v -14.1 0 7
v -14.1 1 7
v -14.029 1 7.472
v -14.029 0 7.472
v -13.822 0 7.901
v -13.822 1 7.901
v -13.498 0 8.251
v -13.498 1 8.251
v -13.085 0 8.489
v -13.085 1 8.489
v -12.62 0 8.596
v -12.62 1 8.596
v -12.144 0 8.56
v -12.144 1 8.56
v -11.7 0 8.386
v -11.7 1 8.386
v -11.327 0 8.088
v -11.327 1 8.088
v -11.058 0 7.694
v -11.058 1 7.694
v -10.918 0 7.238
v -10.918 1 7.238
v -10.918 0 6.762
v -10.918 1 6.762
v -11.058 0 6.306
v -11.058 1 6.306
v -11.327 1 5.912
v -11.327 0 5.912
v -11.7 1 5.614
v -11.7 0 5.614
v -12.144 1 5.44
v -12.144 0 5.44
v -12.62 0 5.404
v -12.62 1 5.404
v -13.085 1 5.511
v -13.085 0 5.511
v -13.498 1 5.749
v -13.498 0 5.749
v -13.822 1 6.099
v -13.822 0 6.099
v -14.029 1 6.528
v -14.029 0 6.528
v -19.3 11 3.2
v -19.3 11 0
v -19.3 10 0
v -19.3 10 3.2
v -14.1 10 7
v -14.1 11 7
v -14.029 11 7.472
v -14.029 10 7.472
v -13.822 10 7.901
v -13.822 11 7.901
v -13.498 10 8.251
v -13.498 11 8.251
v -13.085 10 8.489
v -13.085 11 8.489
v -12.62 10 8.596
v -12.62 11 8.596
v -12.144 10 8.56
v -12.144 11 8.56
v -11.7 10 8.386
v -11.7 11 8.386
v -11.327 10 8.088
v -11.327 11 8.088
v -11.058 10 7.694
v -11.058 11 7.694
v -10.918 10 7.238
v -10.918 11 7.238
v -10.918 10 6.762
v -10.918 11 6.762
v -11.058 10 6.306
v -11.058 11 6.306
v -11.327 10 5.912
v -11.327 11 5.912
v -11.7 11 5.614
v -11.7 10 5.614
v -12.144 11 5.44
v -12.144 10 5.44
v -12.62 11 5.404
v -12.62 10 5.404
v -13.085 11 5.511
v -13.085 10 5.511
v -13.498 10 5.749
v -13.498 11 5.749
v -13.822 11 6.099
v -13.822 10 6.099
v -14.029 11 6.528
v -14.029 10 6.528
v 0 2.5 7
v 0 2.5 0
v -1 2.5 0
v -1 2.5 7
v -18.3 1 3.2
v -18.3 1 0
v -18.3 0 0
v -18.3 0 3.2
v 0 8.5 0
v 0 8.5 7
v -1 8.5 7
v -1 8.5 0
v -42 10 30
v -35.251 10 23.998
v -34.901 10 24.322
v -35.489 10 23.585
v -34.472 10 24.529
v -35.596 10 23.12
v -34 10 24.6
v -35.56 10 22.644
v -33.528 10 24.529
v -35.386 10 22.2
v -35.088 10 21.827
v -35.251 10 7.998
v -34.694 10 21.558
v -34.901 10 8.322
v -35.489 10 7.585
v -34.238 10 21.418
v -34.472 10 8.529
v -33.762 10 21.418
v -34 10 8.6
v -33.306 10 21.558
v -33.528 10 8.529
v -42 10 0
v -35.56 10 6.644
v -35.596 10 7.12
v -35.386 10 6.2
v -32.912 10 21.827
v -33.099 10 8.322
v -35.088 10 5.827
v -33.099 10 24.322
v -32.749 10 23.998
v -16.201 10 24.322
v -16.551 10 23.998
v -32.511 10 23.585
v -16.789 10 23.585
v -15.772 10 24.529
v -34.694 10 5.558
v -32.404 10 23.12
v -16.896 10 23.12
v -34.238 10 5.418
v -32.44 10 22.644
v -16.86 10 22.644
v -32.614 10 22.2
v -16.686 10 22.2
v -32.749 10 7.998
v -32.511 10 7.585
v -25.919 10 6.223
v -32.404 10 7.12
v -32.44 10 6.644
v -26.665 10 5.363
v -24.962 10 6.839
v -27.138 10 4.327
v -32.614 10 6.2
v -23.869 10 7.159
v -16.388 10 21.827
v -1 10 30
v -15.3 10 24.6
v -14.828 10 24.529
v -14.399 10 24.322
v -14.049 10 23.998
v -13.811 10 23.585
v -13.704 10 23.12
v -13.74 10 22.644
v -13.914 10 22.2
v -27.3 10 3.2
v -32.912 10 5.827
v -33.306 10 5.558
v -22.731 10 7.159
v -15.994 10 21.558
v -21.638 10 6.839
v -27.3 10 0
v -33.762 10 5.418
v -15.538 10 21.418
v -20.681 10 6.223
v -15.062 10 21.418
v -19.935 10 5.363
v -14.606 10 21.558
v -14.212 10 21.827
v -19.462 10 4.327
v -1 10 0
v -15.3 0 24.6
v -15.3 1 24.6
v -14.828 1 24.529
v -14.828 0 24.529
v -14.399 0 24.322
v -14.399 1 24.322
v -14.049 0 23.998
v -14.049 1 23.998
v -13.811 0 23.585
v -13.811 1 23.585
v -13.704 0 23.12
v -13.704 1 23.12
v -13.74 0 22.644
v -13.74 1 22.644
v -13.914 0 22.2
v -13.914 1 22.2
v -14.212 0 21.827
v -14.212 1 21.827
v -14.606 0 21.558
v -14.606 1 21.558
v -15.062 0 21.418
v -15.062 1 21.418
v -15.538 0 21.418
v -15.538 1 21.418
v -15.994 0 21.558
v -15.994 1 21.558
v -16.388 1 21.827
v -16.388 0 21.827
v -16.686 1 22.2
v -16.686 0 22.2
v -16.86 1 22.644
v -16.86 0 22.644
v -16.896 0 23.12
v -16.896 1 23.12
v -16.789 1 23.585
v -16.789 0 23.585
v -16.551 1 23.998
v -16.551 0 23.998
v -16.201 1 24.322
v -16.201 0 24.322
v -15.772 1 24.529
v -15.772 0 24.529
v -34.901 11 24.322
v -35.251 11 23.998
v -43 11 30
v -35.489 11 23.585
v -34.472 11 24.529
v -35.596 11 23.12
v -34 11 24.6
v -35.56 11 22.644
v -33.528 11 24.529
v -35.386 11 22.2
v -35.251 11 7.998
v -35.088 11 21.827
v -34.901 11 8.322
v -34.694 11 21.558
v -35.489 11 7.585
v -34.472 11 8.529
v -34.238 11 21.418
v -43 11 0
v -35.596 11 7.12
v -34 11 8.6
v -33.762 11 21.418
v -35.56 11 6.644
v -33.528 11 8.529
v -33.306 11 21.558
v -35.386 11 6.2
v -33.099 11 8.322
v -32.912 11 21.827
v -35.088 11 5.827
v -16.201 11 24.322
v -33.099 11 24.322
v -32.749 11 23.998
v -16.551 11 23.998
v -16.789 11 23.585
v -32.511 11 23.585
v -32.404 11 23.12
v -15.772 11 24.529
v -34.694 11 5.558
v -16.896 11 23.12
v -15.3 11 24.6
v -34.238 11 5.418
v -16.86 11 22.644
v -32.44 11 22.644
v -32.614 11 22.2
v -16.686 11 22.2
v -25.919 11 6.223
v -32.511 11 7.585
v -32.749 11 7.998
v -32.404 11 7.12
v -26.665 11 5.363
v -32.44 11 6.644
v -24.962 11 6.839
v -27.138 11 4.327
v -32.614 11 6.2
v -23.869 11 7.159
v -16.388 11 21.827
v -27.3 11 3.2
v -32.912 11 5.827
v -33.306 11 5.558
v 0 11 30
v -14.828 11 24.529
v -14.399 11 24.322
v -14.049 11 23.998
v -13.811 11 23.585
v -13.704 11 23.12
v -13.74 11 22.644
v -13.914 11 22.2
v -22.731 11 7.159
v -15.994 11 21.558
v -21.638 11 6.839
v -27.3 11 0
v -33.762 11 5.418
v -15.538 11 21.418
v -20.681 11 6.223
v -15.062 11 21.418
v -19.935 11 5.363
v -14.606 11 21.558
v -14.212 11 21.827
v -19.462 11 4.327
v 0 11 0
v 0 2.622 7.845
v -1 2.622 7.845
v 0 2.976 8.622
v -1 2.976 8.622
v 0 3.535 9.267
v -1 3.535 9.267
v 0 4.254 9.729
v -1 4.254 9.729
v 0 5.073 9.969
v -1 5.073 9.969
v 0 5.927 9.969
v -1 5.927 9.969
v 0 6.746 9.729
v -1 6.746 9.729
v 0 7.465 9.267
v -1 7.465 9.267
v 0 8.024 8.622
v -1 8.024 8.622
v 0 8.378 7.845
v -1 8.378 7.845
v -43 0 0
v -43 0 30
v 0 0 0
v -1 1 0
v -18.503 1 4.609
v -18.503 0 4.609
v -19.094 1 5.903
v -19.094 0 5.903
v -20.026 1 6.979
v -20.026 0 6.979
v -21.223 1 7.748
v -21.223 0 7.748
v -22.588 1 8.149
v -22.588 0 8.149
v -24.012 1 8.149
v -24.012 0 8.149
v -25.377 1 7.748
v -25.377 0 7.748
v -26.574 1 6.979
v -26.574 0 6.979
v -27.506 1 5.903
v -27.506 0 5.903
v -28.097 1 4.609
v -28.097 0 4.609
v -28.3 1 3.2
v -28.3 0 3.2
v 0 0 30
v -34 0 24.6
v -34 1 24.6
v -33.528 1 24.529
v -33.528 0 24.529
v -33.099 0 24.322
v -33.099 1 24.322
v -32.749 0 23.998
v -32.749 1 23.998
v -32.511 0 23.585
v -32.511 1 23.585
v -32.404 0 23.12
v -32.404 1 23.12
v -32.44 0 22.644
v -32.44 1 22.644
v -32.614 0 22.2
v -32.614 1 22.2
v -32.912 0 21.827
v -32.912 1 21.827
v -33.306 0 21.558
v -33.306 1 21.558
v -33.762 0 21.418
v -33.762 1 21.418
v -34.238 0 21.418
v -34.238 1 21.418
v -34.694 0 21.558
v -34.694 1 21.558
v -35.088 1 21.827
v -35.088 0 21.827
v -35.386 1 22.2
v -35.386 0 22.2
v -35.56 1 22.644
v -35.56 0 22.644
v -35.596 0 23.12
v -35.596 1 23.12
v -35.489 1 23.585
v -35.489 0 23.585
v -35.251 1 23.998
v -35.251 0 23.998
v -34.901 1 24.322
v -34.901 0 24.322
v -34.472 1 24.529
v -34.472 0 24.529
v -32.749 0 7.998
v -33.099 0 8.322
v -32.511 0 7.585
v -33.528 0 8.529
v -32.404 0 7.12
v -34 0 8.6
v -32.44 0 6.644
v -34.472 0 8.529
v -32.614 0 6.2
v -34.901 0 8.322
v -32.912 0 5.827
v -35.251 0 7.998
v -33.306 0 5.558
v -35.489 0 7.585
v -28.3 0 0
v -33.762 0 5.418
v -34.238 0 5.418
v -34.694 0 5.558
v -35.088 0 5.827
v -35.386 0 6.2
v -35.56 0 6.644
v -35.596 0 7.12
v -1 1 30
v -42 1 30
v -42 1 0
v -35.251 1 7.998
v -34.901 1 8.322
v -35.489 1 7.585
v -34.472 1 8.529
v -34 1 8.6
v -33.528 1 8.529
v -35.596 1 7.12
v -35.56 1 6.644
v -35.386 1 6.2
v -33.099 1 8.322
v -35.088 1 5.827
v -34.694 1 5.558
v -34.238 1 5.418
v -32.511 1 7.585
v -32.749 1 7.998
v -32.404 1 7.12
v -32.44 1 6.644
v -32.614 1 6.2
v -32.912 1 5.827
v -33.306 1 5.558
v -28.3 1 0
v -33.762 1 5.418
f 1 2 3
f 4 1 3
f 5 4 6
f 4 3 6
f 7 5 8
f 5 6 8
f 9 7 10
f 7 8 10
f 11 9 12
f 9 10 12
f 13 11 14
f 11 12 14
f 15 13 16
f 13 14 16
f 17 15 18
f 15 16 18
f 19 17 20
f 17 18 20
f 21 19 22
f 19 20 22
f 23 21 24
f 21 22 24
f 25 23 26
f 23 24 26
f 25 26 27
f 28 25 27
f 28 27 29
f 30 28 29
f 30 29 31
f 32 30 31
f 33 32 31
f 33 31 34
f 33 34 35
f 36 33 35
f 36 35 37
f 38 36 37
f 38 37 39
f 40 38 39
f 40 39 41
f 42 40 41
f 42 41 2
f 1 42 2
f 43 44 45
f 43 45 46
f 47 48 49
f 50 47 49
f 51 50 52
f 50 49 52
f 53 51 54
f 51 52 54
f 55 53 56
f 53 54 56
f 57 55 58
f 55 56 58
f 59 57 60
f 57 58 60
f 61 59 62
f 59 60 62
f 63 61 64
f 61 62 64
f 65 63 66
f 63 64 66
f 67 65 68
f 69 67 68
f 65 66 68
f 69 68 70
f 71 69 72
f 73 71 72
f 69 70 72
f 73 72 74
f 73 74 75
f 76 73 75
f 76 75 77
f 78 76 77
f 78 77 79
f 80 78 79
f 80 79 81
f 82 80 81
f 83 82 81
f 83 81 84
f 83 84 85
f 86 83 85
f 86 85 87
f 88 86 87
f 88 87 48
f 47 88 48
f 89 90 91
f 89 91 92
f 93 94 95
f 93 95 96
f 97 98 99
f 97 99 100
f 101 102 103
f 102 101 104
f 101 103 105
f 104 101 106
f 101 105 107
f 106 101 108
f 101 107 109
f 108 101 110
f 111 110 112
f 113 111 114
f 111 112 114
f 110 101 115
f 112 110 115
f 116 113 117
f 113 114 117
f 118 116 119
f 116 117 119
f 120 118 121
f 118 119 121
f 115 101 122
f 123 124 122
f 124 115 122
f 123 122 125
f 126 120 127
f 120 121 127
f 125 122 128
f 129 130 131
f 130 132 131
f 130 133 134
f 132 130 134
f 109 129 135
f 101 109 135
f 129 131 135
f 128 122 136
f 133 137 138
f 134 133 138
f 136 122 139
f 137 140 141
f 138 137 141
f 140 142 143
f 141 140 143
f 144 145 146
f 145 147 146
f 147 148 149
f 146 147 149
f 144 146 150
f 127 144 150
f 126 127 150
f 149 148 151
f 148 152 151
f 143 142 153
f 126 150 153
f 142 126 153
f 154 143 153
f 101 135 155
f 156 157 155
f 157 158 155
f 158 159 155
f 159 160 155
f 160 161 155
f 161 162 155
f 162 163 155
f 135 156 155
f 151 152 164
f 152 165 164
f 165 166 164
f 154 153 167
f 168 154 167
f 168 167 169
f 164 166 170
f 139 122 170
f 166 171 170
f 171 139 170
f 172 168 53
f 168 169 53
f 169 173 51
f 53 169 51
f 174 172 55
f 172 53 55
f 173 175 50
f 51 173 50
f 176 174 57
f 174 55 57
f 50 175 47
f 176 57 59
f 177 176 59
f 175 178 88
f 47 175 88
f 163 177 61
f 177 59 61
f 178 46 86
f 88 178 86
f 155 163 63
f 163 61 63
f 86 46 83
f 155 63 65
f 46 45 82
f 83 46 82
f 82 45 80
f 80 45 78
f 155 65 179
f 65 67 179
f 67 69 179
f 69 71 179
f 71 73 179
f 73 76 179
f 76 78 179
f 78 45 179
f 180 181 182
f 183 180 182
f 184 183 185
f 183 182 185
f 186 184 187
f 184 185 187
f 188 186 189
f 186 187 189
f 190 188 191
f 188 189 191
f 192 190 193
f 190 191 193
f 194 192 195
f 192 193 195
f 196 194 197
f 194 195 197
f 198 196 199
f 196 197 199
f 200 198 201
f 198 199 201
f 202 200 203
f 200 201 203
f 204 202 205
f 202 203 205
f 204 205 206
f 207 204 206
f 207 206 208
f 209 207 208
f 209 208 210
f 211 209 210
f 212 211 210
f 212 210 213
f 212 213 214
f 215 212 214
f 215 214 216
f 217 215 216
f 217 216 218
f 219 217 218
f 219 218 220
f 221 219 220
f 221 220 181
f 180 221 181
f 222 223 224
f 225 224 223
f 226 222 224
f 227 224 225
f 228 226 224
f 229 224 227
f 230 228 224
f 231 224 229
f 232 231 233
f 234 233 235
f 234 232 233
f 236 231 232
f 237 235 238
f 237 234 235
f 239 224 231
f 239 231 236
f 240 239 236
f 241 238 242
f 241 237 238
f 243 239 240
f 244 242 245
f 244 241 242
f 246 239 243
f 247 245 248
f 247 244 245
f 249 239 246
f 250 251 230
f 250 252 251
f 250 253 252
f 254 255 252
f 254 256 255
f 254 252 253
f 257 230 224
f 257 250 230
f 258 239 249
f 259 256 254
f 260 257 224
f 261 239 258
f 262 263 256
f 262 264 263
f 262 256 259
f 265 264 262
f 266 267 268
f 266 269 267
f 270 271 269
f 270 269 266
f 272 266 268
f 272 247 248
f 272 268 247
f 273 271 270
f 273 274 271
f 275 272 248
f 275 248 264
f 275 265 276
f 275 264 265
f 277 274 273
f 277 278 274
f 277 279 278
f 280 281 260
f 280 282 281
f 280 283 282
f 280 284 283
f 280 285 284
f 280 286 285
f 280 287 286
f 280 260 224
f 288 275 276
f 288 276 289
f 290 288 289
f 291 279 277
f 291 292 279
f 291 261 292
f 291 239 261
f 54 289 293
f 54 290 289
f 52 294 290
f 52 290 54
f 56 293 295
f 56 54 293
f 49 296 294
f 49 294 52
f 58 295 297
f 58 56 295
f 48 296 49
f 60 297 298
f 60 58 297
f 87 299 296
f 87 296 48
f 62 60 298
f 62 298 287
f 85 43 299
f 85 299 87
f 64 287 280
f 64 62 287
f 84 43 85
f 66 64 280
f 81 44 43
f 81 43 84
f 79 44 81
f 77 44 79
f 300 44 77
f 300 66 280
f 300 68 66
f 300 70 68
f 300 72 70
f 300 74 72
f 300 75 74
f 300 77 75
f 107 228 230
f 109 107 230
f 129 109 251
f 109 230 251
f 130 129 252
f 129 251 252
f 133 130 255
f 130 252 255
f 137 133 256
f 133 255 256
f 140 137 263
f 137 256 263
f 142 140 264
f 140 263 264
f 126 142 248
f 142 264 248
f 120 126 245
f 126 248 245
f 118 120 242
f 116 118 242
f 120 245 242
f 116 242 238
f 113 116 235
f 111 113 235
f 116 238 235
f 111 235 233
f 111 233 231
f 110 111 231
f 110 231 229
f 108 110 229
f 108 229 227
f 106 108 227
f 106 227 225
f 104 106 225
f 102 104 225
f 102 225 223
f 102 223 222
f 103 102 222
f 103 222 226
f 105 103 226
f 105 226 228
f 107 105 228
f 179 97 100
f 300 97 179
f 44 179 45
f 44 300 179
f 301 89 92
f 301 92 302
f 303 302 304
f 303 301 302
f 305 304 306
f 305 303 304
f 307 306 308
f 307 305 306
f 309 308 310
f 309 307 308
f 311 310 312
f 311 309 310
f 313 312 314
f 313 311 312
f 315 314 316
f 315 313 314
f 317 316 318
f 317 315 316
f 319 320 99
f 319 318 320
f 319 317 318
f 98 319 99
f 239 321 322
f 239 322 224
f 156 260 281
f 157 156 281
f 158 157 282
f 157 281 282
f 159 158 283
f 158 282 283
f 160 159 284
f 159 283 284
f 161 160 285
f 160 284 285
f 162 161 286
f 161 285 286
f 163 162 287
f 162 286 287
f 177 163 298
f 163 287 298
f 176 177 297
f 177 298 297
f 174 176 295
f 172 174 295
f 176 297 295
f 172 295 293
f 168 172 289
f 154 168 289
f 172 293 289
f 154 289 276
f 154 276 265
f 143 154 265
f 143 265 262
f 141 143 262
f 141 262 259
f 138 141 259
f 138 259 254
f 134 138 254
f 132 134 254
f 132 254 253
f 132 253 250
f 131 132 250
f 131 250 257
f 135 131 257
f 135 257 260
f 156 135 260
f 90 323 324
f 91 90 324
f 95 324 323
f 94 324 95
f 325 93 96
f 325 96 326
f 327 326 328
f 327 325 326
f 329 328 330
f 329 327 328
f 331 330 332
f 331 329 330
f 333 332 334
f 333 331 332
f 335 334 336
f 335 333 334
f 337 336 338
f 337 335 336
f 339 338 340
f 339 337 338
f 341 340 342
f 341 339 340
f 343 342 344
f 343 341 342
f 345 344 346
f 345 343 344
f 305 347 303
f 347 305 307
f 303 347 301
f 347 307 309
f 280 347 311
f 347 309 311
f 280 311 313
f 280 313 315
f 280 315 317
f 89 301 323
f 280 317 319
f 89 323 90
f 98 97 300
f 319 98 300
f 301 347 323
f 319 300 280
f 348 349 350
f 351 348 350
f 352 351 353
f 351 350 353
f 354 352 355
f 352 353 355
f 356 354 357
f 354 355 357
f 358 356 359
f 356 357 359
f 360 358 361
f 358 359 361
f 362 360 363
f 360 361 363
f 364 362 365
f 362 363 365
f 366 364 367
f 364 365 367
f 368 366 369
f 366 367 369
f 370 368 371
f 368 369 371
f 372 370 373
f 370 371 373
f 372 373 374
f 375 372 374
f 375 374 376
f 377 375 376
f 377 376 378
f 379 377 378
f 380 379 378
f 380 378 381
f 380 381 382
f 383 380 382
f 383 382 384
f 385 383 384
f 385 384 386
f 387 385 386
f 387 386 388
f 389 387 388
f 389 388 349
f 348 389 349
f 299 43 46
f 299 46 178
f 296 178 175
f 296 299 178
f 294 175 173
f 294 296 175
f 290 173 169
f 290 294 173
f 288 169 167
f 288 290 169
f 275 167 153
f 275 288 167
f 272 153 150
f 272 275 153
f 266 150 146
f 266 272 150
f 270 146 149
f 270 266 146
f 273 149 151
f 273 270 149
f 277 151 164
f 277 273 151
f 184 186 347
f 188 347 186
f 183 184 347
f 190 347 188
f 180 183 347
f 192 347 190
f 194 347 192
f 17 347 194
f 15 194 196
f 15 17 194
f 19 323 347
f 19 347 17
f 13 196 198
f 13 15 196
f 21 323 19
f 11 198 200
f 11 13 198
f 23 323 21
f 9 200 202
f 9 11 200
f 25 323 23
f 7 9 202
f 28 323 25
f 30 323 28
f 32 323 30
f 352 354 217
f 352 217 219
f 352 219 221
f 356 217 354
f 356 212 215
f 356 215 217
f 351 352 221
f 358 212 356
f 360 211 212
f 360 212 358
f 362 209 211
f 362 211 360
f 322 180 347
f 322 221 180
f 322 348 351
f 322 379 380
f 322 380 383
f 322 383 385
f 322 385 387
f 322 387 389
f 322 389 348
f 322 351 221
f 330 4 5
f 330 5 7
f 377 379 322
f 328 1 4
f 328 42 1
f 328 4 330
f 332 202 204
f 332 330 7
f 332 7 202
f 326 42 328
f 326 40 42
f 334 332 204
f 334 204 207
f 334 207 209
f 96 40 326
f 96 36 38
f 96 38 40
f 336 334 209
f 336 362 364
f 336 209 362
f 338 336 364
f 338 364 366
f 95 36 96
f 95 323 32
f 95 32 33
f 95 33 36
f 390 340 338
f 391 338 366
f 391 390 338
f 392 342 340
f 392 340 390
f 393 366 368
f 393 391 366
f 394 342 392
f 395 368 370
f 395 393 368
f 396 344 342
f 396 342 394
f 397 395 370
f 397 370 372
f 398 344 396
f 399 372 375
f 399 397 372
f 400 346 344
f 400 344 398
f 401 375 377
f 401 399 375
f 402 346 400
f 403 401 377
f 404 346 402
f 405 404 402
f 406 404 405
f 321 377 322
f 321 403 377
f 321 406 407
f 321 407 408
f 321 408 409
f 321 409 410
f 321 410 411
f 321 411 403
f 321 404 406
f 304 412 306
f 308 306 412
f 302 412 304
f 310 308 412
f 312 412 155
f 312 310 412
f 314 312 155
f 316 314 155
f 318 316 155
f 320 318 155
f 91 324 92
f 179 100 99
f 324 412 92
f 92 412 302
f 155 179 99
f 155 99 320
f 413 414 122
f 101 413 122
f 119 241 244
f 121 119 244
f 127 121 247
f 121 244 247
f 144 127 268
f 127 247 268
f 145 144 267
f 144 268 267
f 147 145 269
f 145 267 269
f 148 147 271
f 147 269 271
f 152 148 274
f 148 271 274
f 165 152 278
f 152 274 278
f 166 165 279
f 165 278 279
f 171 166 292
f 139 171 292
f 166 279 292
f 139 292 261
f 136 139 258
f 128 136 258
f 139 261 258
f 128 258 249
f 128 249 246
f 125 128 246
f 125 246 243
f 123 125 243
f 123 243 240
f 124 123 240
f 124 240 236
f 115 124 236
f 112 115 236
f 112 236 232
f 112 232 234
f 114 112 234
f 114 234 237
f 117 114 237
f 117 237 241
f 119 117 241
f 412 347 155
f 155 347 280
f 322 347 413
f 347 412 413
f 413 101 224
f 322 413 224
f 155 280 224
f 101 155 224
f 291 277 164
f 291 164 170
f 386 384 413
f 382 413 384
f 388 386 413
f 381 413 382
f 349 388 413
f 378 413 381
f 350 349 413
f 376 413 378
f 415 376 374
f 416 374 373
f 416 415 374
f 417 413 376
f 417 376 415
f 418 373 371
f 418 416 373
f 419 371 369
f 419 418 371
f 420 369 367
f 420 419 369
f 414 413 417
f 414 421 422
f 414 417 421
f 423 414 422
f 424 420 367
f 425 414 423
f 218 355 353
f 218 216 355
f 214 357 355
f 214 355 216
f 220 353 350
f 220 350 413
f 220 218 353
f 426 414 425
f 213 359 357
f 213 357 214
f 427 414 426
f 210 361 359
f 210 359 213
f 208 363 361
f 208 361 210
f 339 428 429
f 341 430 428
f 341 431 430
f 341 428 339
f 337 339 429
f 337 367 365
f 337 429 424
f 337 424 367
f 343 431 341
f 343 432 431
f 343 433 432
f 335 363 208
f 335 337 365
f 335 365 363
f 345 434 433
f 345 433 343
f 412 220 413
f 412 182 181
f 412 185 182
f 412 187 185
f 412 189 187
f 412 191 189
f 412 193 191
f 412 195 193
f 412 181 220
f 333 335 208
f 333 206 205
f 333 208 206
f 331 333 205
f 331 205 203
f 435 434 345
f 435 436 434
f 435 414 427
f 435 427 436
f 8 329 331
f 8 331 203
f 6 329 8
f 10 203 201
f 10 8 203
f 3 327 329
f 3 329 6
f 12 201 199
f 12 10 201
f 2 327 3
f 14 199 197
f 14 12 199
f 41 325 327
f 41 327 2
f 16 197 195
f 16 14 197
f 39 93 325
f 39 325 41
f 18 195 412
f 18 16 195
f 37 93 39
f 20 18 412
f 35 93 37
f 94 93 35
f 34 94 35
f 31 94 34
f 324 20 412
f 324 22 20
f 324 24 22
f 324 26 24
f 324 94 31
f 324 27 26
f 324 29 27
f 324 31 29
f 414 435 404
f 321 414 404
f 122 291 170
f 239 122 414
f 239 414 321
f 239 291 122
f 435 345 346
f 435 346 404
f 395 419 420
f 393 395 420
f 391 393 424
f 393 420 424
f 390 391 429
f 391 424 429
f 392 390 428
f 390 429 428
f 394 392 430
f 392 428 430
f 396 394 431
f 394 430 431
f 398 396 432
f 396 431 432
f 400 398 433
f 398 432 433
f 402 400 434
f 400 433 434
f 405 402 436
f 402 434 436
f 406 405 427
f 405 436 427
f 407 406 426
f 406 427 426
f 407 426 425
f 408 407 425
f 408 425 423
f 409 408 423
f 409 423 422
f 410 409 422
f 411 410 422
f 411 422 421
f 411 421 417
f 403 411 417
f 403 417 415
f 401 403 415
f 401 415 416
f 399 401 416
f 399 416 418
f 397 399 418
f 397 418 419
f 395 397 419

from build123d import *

# Parameters (mm, degrees)
SKETCH_2_W          = 41
SKETCH_2_H          = 9
EXTRUDE_1_DEPTH     = 30
SKETCH_3_R          = 1.6
CUT_EXTRUDE_1_DEPTH = 54.572380944
CUT_EXTRUDE_2_DEPTH = 3
CUT_EXTRUDE_3_DEPTH = 3
CUT_EXTRUDE_4_DEPTH = 3


with BuildPart() as part:
    # 草图2 → 凸台-拉伸1 (new body)
    with BuildSketch(Plane.XY):
        Polygon((0, 0), (-43, 0), (-43, 11), (0, 11), (0, 10), (0, 1), align=None)
        with Locations((-21.5, 5.5)):
            Rectangle(SKETCH_2_W, SKETCH_2_H, mode=Mode.SUBTRACT)
    extrude(amount=EXTRUDE_1_DEPTH)

    # 草图3 → 切除-拉伸1 (cut, through all)
    with BuildSketch(Plane(origin=(0, 11, 0), x_dir=(1, 0, 0), z_dir=(0, 1, 0))):
        with Locations(Location((-34, -7, 0), (0, 0, 270))):
            Circle(SKETCH_3_R)
        with Locations(Location((-34, -23, 0), (0, 0, 270))):
            Circle(SKETCH_3_R)
        with Locations(Location((-15.3, -23, 0), (0, 0, 270))):
            Circle(SKETCH_3_R)
        with Locations(Location((-12.5, -7, 0), (0, 0, 180))):
            Circle(SKETCH_3_R)
    extrude(amount=-CUT_EXTRUDE_1_DEPTH, mode=Mode.SUBTRACT)

    # 草图4 → 切除-拉伸2 (cut)
    with BuildSketch(Plane(origin=(0, 11, 0), x_dir=(1, 0, 0), z_dir=(0, 1, 0))):
        with BuildLine():
            Line((-19.3, 0), (-19.3, -3.2))
            ThreePointArc((-19.3, -3.2), (-23.3, -7.2), (-27.3, -3.2))
            Line((-27.3, -3.2), (-27.3, 0))
            Line((-27.3, 0), (-19.3, 0))
        make_face()
    extrude(amount=-CUT_EXTRUDE_2_DEPTH, mode=Mode.SUBTRACT)

    # 草图6 → 切除-拉伸3 (cut)
    with BuildSketch(Plane(origin=(0, 1, 0), x_dir=(1, 0, 0), z_dir=(0, 1, 0))):
        with BuildLine():
            Line((-28.3, -3.2), (-28.3, 0))
            Line((-28.3, 0), (-18.3, 0))
            Line((-18.3, 0), (-18.3, -3.2))
            ThreePointArc((-18.3, -3.2), (-23.3, -8.2), (-28.3, -3.2))
        make_face()
    extrude(amount=-CUT_EXTRUDE_3_DEPTH, mode=Mode.SUBTRACT)

    # 草图7 → 切除-拉伸4 (cut)
    with BuildSketch(Plane(origin=(0, 0, 0), x_dir=(0, 0, -1), z_dir=(1, 0, 0))):
        with BuildLine():
            Line((-7, 8.5), (0, 8.5))
            Line((0, 8.5), (0, 2.5))
            Line((0, 2.5), (-7, 2.5))
            ThreePointArc((-7, 2.5), (-10, 5.5), (-7, 8.5))
        make_face()
    extrude(amount=-CUT_EXTRUDE_4_DEPTH, mode=Mode.SUBTRACT)


solid = part.part
